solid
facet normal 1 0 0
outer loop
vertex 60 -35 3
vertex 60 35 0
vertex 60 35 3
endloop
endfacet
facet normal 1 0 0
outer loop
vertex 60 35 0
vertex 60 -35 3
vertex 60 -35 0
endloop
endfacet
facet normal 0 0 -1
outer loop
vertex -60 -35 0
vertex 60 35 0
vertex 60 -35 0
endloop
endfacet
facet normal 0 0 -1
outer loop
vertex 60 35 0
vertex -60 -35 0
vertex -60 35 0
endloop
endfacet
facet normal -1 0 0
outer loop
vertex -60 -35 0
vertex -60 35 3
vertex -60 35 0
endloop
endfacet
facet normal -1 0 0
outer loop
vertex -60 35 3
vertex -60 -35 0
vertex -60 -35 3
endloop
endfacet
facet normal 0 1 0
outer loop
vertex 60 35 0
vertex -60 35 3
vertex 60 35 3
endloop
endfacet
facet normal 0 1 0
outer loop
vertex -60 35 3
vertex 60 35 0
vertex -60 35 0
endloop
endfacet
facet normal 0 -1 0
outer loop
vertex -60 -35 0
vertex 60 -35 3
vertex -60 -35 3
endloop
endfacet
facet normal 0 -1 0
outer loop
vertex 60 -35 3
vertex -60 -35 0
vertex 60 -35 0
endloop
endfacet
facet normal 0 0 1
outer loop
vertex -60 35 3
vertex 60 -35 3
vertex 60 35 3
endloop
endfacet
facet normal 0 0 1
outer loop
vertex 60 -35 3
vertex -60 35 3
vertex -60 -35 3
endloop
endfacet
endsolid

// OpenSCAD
// Mini horizontal gel-electrophoresis box - buffer tank
// Print orientation: tank rests on XY plane, open top facing +Z

// ---------- Parameters ----------
outer_x      = 120;   // outer length (X)
outer_y      = 70;    // outer width (Y)
tank_h       = 40;    // outer height (Z)
wall         = 3;     // wall thickness
floor        = 3;     // floor thickness under inner volume
platform_x   = 60;    // platform length in X (centred)
platform_y   = outer_y; // platform spans full inner width
platform_top = 13;    // platform top height above inner floor
hole_d       = 2;     // electrode hole diameter
hole_y       = 0;     // electrode hole Y position
hole_z       = 30;    // electrode hole Z position

eps          = 0.5;   // cutter overshoot past faces
$fn          = 64;    // curve resolution

// ---------- Derived ----------
inner_h   = tank_h - floor;                    // inner floor-to-top height
platform_z = floor + platform_top;             // platform top (absolute Z)
chamber_h = inner_h - platform_top;            // chamber height above platform

// ---------- Model ----------
difference() {
    // Main tank body
    translate([-outer_x/2, -outer_y/2, 0])
        cube([outer_x, outer_y, tank_h]);

    // Central open channel (cut through, top to bottom)
    translate([-outer_x/2, -platform_y/2, floor])
        cube([outer_x, platform_y, tank_h - floor + eps]);

    // Raised platform for gel tray
    union() {
        translate([-platform_x/2, -platform_y/2, platform_z])
            cube([platform_x, platform_y, chamber_h + eps]);   // lower block
        translate([-platform_x/2, -platform_y/2, tank_h - wall])
            cube([platform_x, platform_y, wall + eps]);         // top cap
    }

    // Electrode holes through end walls, along X
    for (sx = [-1, 1])
        translate([sx > 0 ? outer_x/2 - hole_d : -outer_x/2, hole_y, hole_z])
            rotate([0, 90, 0])
                cylinder(d = hole_d, h = outer_y + 2*eps);
}
